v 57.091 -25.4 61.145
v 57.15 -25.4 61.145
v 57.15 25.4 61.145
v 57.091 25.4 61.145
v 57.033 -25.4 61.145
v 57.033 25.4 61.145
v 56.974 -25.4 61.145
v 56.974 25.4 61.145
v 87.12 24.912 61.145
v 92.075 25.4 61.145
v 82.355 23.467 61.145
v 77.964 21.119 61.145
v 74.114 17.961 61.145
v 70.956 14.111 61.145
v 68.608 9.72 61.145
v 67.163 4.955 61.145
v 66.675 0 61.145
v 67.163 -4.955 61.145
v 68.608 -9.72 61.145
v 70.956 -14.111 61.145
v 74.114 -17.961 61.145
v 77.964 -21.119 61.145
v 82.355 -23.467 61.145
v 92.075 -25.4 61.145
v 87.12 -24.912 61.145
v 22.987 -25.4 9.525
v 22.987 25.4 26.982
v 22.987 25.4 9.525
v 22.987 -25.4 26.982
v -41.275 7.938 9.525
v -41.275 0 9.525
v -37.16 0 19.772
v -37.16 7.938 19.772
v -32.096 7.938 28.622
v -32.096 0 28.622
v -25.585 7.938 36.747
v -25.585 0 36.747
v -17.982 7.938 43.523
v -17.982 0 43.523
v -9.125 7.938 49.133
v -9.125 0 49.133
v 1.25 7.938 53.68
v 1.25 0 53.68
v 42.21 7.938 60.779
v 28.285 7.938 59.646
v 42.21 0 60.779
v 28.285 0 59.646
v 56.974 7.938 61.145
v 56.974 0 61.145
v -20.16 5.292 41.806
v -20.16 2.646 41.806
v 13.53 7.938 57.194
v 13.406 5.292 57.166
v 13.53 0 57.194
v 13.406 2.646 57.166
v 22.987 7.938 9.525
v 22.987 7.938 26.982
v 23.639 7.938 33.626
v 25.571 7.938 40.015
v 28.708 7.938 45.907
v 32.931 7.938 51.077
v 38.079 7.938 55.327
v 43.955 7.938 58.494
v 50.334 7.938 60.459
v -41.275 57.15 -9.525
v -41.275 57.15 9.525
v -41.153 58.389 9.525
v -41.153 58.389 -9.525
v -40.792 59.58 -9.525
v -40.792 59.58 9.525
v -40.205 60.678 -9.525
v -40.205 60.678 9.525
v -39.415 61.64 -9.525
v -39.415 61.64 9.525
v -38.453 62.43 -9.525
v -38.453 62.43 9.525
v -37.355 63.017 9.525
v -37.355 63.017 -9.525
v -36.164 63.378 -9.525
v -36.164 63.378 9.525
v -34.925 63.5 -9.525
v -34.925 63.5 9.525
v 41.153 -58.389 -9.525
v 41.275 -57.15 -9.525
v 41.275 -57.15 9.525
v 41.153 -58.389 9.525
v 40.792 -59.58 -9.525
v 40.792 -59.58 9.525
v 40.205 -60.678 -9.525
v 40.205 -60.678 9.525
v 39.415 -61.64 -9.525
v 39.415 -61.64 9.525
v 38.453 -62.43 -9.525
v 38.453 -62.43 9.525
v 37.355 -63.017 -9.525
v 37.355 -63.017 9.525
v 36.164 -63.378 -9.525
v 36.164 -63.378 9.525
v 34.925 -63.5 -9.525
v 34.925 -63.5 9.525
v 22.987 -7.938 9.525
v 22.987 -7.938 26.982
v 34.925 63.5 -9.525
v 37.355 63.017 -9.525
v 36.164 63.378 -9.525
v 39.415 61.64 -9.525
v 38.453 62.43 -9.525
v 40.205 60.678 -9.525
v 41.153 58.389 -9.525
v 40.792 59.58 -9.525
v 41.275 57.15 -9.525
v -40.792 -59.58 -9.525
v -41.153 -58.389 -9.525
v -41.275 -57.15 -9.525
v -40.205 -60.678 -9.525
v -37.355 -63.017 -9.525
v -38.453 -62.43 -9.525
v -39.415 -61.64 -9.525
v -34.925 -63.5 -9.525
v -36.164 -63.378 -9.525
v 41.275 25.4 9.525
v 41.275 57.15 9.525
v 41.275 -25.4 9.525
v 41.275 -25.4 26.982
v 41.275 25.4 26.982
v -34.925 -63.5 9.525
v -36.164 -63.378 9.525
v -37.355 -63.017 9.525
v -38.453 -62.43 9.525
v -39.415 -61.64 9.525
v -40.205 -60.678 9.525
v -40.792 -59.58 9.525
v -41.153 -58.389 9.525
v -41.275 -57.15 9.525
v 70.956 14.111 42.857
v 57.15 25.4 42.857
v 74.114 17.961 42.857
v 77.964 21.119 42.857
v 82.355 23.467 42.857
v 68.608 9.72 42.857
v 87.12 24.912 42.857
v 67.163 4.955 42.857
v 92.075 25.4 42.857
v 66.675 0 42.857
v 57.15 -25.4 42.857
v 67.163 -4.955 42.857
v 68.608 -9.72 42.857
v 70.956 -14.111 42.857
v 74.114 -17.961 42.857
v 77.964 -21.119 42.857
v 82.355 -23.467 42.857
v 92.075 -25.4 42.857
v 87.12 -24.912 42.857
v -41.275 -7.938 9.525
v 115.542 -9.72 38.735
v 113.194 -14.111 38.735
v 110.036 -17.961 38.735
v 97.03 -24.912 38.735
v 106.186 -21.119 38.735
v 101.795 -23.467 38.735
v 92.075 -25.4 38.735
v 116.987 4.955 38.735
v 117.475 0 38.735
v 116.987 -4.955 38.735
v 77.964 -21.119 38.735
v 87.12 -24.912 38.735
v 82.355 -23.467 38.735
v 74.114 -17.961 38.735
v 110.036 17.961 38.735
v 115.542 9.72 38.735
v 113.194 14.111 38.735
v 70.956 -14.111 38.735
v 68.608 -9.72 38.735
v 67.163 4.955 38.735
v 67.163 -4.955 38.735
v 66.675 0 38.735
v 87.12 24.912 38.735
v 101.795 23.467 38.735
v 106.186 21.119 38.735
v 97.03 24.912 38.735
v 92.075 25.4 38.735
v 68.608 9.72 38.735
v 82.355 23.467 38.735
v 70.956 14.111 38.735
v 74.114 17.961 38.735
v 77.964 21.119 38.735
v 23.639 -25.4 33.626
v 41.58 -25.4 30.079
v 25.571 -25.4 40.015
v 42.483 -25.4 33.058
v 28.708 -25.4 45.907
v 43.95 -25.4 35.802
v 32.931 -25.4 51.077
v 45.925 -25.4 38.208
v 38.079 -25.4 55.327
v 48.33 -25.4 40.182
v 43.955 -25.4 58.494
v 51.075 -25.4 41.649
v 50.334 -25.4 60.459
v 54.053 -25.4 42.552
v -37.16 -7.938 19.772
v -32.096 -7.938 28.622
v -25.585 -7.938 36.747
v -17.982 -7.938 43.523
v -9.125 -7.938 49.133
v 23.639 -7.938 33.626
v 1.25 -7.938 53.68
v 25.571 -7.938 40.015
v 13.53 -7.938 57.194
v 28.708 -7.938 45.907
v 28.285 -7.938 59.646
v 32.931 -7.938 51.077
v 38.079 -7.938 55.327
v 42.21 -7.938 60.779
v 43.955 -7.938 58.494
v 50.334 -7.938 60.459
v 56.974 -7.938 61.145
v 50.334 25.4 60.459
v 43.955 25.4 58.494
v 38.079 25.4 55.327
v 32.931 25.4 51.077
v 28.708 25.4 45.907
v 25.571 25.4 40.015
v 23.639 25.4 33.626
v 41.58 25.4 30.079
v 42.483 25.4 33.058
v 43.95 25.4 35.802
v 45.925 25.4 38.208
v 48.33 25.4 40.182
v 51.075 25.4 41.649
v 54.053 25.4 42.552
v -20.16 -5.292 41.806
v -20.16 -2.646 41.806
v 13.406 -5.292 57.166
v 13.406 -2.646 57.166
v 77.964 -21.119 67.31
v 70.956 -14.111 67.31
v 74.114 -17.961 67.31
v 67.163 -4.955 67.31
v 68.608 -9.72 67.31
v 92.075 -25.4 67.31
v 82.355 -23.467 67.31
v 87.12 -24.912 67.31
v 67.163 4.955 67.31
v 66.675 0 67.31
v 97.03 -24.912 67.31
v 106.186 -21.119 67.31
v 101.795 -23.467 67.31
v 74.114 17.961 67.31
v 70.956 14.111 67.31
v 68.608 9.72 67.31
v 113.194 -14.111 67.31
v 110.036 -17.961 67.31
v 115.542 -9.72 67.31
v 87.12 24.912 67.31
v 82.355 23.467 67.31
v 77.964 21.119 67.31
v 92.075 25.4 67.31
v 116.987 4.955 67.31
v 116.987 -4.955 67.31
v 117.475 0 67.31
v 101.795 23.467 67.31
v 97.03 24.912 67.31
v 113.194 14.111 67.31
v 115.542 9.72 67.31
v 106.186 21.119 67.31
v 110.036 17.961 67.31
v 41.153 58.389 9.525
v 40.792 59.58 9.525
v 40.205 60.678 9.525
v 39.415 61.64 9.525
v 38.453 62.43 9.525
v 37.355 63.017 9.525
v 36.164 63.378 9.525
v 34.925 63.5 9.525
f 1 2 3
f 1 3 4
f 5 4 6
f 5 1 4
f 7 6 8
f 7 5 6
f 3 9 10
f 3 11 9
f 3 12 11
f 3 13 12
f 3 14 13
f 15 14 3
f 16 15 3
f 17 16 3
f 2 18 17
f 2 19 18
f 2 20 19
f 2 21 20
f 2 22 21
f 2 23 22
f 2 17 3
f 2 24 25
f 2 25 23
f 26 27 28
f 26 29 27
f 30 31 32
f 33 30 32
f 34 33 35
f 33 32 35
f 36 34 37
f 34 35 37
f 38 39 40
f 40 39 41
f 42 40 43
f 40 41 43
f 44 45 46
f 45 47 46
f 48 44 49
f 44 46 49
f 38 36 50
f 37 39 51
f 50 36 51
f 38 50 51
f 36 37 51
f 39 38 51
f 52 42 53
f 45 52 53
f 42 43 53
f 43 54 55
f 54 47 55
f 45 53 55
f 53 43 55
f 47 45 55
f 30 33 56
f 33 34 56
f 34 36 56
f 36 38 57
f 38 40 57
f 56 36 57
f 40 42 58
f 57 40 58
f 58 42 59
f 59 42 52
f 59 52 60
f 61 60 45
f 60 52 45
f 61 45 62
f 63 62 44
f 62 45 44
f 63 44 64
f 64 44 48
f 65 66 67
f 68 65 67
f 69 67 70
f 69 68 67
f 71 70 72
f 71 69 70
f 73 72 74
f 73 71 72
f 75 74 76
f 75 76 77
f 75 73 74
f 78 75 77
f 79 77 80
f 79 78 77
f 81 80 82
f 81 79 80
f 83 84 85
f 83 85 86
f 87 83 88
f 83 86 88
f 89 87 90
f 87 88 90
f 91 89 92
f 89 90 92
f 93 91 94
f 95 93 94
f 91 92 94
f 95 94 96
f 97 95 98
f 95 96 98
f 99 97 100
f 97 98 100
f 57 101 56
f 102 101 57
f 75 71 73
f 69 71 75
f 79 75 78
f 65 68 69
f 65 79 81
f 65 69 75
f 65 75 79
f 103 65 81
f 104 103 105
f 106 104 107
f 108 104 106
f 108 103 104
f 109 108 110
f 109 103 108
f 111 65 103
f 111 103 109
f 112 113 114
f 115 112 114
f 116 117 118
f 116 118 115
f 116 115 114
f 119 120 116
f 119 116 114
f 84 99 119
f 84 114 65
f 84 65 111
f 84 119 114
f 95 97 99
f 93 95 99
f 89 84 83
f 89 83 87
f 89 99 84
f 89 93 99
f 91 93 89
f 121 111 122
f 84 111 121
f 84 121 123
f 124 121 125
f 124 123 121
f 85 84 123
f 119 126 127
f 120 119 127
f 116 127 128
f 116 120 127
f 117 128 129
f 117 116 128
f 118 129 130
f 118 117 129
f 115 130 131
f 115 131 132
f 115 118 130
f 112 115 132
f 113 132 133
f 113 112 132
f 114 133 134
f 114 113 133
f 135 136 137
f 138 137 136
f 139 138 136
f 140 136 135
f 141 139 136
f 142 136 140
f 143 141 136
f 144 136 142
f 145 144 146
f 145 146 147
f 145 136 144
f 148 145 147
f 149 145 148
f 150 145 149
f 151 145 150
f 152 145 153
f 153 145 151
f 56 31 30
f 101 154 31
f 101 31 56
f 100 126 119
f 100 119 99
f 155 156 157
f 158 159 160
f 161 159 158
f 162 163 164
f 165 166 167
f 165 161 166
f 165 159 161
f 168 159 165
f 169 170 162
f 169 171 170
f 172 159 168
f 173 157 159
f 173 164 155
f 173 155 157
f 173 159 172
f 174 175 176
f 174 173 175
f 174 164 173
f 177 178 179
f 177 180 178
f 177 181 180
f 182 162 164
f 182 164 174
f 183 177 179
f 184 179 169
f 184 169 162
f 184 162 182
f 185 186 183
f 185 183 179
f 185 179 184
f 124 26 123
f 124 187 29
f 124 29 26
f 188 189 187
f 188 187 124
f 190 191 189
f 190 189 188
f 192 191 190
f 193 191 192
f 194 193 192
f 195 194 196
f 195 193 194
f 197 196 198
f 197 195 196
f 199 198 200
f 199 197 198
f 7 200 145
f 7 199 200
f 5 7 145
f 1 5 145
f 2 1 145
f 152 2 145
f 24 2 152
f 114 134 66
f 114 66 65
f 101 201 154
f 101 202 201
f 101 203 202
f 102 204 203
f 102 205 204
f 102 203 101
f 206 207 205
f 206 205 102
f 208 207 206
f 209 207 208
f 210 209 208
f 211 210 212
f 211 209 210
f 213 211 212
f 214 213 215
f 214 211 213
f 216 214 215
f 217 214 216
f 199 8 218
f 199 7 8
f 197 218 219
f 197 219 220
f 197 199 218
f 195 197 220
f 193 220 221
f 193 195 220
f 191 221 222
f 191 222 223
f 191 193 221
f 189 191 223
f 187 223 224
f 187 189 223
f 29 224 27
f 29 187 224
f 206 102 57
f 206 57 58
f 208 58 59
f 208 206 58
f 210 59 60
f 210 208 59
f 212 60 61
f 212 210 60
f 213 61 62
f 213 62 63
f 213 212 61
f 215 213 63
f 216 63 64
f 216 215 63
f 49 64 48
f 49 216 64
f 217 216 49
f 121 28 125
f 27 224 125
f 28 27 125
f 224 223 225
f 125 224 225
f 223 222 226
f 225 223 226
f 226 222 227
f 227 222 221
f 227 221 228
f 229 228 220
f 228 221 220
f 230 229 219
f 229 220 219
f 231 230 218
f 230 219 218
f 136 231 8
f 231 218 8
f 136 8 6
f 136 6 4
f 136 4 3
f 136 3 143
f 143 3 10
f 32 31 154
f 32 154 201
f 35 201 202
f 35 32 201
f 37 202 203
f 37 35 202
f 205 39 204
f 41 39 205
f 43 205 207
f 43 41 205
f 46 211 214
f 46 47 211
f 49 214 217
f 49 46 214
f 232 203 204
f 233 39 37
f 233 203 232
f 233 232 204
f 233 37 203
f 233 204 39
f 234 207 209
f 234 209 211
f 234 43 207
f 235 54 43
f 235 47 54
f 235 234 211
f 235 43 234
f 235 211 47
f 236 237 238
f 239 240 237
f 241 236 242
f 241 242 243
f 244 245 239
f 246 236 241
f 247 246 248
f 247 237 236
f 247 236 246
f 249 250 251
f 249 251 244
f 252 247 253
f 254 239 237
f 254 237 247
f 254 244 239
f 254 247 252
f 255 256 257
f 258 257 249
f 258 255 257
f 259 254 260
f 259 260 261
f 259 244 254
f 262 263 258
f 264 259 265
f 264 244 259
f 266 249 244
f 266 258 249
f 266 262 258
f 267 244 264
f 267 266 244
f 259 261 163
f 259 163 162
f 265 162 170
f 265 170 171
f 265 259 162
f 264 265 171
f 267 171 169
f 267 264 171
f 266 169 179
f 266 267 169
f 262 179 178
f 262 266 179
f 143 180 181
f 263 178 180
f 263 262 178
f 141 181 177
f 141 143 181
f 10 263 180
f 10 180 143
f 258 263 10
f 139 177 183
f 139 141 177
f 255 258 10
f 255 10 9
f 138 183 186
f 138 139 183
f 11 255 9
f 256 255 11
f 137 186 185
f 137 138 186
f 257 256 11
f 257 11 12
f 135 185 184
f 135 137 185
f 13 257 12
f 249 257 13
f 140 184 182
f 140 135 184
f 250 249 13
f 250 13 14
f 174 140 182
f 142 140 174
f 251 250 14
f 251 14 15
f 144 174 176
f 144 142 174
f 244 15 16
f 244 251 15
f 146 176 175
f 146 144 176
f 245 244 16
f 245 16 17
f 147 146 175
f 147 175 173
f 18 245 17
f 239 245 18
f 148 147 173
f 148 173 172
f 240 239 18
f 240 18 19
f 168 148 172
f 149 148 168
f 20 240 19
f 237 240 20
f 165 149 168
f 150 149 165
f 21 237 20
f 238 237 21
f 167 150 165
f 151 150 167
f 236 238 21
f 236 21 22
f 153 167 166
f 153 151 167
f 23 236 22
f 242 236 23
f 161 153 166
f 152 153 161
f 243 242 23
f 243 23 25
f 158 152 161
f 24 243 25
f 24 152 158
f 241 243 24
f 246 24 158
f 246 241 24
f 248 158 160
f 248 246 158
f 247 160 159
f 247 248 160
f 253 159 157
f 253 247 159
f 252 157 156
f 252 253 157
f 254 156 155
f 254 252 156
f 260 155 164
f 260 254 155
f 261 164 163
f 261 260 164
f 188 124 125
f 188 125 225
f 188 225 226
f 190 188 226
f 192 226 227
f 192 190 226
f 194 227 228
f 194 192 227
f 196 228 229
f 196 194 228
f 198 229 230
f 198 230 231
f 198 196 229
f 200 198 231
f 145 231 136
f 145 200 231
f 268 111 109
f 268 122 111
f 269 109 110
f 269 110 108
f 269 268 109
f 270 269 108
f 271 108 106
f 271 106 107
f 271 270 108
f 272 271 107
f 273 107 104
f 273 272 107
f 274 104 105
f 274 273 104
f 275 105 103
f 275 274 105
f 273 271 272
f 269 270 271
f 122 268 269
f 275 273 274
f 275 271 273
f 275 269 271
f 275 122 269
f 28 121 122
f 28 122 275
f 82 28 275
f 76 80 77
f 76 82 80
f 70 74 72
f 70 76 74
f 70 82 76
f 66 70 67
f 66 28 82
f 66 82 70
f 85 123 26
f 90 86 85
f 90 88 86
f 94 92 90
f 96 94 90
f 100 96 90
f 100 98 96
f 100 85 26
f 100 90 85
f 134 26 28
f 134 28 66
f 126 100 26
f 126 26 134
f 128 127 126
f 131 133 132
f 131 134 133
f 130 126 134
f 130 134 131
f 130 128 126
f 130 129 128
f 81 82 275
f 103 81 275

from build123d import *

# Parameters (mm, degrees)
F1_DEPTH = 63.5
F0_W     = 25.4
F0_H     = 18.2879993558
F2_DEPTH = 25.4
F3_DEPTH = 7.9375
F5_R     = 6.35


with BuildPart() as f1:
    # F0 (on Front) → F1 (new body, symmetric)
    with BuildSketch(Plane.XZ):
        Polygon((41.275, -9.525), (41.275, 9.525), (22.9870006442, 9.525), (-41.275, 9.525), (-41.275, -9.525), align=None)
    extrude(amount=F1_DEPTH, both=True)

    # F0 (on Front) → F2 (join, symmetric)
    with BuildSketch(Plane.XZ):
        with BuildLine():
            Line((22.9870006442, 9.525), (41.275, 9.525))
            Line((41.275, 9.525), (41.275, 26.98242))
            ThreePointArc((41.275, 26.98242), (45.9246798487, 38.2077401513), (57.15, 42.85742))
            Line((57.15, 42.85742), (66.675, 42.85742))
            Line((66.675, 42.85742), (66.675, 61.1454193558))
            Line((66.675, 61.1454193558), (57.15, 61.1454193558))
            ThreePointArc((57.15, 61.1454193558), (57.0620496409, 61.1453061444), (56.9740998647, 61.1449665111))
            ThreePointArc((56.9740998647, 61.1449665111), (32.931001247, 51.0770381623), (22.9870006442, 26.98242))
            Line((22.9870006442, 26.98242), (22.9870006442, 9.525))
        make_face()
        with Locations((79.375, 52.0014196779)):
            Rectangle(F0_W, F0_H)
    extrude(amount=F2_DEPTH, both=True)

    # F0 (on Front) → F4 (revolve)
    with BuildSketch(Plane.XZ):
        Polygon((92.075, 61.1454193558), (92.075, 42.85742), (92.075, 38.735), (117.475, 38.735), (117.475, 67.31), (92.075, 67.31), align=None)
    revolve(axis=Axis((92.075, 0, 53.0225), (0, 0, 1)))

    # F5
    f5_edges = [f1.edges().sort_by_distance(p)[0] for p in [
        (-41.275, -63.5, 0),
        (41.275, -63.5, 0),
        (41.275, 63.5, 0),
        (-41.275, 63.5, 0),
    ]]
    fillet(f5_edges, radius=F5_R)


with BuildPart() as f3:
    # F0 (on Front) → F3 (new body, symmetric)
    with BuildSketch(Plane.XZ):
        with BuildLine():
            Line((-41.275, 9.525), (22.9870006442, 9.525))
            Line((22.9870006442, 9.525), (22.9870006442, 26.98242))
            ThreePointArc((22.9870006442, 26.98242), (32.931001247, 51.0770381623), (56.9740998647, 61.1449665111))
            add(Edge.make_bspline(
                [(-41.275, 9.525), (-27.2030152145, 52.1123864879), (9.221613378, 61.0112480139), (56.9740998647, 61.1449665111)],
                knots=[0, 0, 0, 0, 111.003961493, 111.003961493, 111.003961493, 111.003961493], degree=3))
        make_face()
    extrude(amount=F3_DEPTH, both=True)


solid = Compound([f1.part, f3.part])
